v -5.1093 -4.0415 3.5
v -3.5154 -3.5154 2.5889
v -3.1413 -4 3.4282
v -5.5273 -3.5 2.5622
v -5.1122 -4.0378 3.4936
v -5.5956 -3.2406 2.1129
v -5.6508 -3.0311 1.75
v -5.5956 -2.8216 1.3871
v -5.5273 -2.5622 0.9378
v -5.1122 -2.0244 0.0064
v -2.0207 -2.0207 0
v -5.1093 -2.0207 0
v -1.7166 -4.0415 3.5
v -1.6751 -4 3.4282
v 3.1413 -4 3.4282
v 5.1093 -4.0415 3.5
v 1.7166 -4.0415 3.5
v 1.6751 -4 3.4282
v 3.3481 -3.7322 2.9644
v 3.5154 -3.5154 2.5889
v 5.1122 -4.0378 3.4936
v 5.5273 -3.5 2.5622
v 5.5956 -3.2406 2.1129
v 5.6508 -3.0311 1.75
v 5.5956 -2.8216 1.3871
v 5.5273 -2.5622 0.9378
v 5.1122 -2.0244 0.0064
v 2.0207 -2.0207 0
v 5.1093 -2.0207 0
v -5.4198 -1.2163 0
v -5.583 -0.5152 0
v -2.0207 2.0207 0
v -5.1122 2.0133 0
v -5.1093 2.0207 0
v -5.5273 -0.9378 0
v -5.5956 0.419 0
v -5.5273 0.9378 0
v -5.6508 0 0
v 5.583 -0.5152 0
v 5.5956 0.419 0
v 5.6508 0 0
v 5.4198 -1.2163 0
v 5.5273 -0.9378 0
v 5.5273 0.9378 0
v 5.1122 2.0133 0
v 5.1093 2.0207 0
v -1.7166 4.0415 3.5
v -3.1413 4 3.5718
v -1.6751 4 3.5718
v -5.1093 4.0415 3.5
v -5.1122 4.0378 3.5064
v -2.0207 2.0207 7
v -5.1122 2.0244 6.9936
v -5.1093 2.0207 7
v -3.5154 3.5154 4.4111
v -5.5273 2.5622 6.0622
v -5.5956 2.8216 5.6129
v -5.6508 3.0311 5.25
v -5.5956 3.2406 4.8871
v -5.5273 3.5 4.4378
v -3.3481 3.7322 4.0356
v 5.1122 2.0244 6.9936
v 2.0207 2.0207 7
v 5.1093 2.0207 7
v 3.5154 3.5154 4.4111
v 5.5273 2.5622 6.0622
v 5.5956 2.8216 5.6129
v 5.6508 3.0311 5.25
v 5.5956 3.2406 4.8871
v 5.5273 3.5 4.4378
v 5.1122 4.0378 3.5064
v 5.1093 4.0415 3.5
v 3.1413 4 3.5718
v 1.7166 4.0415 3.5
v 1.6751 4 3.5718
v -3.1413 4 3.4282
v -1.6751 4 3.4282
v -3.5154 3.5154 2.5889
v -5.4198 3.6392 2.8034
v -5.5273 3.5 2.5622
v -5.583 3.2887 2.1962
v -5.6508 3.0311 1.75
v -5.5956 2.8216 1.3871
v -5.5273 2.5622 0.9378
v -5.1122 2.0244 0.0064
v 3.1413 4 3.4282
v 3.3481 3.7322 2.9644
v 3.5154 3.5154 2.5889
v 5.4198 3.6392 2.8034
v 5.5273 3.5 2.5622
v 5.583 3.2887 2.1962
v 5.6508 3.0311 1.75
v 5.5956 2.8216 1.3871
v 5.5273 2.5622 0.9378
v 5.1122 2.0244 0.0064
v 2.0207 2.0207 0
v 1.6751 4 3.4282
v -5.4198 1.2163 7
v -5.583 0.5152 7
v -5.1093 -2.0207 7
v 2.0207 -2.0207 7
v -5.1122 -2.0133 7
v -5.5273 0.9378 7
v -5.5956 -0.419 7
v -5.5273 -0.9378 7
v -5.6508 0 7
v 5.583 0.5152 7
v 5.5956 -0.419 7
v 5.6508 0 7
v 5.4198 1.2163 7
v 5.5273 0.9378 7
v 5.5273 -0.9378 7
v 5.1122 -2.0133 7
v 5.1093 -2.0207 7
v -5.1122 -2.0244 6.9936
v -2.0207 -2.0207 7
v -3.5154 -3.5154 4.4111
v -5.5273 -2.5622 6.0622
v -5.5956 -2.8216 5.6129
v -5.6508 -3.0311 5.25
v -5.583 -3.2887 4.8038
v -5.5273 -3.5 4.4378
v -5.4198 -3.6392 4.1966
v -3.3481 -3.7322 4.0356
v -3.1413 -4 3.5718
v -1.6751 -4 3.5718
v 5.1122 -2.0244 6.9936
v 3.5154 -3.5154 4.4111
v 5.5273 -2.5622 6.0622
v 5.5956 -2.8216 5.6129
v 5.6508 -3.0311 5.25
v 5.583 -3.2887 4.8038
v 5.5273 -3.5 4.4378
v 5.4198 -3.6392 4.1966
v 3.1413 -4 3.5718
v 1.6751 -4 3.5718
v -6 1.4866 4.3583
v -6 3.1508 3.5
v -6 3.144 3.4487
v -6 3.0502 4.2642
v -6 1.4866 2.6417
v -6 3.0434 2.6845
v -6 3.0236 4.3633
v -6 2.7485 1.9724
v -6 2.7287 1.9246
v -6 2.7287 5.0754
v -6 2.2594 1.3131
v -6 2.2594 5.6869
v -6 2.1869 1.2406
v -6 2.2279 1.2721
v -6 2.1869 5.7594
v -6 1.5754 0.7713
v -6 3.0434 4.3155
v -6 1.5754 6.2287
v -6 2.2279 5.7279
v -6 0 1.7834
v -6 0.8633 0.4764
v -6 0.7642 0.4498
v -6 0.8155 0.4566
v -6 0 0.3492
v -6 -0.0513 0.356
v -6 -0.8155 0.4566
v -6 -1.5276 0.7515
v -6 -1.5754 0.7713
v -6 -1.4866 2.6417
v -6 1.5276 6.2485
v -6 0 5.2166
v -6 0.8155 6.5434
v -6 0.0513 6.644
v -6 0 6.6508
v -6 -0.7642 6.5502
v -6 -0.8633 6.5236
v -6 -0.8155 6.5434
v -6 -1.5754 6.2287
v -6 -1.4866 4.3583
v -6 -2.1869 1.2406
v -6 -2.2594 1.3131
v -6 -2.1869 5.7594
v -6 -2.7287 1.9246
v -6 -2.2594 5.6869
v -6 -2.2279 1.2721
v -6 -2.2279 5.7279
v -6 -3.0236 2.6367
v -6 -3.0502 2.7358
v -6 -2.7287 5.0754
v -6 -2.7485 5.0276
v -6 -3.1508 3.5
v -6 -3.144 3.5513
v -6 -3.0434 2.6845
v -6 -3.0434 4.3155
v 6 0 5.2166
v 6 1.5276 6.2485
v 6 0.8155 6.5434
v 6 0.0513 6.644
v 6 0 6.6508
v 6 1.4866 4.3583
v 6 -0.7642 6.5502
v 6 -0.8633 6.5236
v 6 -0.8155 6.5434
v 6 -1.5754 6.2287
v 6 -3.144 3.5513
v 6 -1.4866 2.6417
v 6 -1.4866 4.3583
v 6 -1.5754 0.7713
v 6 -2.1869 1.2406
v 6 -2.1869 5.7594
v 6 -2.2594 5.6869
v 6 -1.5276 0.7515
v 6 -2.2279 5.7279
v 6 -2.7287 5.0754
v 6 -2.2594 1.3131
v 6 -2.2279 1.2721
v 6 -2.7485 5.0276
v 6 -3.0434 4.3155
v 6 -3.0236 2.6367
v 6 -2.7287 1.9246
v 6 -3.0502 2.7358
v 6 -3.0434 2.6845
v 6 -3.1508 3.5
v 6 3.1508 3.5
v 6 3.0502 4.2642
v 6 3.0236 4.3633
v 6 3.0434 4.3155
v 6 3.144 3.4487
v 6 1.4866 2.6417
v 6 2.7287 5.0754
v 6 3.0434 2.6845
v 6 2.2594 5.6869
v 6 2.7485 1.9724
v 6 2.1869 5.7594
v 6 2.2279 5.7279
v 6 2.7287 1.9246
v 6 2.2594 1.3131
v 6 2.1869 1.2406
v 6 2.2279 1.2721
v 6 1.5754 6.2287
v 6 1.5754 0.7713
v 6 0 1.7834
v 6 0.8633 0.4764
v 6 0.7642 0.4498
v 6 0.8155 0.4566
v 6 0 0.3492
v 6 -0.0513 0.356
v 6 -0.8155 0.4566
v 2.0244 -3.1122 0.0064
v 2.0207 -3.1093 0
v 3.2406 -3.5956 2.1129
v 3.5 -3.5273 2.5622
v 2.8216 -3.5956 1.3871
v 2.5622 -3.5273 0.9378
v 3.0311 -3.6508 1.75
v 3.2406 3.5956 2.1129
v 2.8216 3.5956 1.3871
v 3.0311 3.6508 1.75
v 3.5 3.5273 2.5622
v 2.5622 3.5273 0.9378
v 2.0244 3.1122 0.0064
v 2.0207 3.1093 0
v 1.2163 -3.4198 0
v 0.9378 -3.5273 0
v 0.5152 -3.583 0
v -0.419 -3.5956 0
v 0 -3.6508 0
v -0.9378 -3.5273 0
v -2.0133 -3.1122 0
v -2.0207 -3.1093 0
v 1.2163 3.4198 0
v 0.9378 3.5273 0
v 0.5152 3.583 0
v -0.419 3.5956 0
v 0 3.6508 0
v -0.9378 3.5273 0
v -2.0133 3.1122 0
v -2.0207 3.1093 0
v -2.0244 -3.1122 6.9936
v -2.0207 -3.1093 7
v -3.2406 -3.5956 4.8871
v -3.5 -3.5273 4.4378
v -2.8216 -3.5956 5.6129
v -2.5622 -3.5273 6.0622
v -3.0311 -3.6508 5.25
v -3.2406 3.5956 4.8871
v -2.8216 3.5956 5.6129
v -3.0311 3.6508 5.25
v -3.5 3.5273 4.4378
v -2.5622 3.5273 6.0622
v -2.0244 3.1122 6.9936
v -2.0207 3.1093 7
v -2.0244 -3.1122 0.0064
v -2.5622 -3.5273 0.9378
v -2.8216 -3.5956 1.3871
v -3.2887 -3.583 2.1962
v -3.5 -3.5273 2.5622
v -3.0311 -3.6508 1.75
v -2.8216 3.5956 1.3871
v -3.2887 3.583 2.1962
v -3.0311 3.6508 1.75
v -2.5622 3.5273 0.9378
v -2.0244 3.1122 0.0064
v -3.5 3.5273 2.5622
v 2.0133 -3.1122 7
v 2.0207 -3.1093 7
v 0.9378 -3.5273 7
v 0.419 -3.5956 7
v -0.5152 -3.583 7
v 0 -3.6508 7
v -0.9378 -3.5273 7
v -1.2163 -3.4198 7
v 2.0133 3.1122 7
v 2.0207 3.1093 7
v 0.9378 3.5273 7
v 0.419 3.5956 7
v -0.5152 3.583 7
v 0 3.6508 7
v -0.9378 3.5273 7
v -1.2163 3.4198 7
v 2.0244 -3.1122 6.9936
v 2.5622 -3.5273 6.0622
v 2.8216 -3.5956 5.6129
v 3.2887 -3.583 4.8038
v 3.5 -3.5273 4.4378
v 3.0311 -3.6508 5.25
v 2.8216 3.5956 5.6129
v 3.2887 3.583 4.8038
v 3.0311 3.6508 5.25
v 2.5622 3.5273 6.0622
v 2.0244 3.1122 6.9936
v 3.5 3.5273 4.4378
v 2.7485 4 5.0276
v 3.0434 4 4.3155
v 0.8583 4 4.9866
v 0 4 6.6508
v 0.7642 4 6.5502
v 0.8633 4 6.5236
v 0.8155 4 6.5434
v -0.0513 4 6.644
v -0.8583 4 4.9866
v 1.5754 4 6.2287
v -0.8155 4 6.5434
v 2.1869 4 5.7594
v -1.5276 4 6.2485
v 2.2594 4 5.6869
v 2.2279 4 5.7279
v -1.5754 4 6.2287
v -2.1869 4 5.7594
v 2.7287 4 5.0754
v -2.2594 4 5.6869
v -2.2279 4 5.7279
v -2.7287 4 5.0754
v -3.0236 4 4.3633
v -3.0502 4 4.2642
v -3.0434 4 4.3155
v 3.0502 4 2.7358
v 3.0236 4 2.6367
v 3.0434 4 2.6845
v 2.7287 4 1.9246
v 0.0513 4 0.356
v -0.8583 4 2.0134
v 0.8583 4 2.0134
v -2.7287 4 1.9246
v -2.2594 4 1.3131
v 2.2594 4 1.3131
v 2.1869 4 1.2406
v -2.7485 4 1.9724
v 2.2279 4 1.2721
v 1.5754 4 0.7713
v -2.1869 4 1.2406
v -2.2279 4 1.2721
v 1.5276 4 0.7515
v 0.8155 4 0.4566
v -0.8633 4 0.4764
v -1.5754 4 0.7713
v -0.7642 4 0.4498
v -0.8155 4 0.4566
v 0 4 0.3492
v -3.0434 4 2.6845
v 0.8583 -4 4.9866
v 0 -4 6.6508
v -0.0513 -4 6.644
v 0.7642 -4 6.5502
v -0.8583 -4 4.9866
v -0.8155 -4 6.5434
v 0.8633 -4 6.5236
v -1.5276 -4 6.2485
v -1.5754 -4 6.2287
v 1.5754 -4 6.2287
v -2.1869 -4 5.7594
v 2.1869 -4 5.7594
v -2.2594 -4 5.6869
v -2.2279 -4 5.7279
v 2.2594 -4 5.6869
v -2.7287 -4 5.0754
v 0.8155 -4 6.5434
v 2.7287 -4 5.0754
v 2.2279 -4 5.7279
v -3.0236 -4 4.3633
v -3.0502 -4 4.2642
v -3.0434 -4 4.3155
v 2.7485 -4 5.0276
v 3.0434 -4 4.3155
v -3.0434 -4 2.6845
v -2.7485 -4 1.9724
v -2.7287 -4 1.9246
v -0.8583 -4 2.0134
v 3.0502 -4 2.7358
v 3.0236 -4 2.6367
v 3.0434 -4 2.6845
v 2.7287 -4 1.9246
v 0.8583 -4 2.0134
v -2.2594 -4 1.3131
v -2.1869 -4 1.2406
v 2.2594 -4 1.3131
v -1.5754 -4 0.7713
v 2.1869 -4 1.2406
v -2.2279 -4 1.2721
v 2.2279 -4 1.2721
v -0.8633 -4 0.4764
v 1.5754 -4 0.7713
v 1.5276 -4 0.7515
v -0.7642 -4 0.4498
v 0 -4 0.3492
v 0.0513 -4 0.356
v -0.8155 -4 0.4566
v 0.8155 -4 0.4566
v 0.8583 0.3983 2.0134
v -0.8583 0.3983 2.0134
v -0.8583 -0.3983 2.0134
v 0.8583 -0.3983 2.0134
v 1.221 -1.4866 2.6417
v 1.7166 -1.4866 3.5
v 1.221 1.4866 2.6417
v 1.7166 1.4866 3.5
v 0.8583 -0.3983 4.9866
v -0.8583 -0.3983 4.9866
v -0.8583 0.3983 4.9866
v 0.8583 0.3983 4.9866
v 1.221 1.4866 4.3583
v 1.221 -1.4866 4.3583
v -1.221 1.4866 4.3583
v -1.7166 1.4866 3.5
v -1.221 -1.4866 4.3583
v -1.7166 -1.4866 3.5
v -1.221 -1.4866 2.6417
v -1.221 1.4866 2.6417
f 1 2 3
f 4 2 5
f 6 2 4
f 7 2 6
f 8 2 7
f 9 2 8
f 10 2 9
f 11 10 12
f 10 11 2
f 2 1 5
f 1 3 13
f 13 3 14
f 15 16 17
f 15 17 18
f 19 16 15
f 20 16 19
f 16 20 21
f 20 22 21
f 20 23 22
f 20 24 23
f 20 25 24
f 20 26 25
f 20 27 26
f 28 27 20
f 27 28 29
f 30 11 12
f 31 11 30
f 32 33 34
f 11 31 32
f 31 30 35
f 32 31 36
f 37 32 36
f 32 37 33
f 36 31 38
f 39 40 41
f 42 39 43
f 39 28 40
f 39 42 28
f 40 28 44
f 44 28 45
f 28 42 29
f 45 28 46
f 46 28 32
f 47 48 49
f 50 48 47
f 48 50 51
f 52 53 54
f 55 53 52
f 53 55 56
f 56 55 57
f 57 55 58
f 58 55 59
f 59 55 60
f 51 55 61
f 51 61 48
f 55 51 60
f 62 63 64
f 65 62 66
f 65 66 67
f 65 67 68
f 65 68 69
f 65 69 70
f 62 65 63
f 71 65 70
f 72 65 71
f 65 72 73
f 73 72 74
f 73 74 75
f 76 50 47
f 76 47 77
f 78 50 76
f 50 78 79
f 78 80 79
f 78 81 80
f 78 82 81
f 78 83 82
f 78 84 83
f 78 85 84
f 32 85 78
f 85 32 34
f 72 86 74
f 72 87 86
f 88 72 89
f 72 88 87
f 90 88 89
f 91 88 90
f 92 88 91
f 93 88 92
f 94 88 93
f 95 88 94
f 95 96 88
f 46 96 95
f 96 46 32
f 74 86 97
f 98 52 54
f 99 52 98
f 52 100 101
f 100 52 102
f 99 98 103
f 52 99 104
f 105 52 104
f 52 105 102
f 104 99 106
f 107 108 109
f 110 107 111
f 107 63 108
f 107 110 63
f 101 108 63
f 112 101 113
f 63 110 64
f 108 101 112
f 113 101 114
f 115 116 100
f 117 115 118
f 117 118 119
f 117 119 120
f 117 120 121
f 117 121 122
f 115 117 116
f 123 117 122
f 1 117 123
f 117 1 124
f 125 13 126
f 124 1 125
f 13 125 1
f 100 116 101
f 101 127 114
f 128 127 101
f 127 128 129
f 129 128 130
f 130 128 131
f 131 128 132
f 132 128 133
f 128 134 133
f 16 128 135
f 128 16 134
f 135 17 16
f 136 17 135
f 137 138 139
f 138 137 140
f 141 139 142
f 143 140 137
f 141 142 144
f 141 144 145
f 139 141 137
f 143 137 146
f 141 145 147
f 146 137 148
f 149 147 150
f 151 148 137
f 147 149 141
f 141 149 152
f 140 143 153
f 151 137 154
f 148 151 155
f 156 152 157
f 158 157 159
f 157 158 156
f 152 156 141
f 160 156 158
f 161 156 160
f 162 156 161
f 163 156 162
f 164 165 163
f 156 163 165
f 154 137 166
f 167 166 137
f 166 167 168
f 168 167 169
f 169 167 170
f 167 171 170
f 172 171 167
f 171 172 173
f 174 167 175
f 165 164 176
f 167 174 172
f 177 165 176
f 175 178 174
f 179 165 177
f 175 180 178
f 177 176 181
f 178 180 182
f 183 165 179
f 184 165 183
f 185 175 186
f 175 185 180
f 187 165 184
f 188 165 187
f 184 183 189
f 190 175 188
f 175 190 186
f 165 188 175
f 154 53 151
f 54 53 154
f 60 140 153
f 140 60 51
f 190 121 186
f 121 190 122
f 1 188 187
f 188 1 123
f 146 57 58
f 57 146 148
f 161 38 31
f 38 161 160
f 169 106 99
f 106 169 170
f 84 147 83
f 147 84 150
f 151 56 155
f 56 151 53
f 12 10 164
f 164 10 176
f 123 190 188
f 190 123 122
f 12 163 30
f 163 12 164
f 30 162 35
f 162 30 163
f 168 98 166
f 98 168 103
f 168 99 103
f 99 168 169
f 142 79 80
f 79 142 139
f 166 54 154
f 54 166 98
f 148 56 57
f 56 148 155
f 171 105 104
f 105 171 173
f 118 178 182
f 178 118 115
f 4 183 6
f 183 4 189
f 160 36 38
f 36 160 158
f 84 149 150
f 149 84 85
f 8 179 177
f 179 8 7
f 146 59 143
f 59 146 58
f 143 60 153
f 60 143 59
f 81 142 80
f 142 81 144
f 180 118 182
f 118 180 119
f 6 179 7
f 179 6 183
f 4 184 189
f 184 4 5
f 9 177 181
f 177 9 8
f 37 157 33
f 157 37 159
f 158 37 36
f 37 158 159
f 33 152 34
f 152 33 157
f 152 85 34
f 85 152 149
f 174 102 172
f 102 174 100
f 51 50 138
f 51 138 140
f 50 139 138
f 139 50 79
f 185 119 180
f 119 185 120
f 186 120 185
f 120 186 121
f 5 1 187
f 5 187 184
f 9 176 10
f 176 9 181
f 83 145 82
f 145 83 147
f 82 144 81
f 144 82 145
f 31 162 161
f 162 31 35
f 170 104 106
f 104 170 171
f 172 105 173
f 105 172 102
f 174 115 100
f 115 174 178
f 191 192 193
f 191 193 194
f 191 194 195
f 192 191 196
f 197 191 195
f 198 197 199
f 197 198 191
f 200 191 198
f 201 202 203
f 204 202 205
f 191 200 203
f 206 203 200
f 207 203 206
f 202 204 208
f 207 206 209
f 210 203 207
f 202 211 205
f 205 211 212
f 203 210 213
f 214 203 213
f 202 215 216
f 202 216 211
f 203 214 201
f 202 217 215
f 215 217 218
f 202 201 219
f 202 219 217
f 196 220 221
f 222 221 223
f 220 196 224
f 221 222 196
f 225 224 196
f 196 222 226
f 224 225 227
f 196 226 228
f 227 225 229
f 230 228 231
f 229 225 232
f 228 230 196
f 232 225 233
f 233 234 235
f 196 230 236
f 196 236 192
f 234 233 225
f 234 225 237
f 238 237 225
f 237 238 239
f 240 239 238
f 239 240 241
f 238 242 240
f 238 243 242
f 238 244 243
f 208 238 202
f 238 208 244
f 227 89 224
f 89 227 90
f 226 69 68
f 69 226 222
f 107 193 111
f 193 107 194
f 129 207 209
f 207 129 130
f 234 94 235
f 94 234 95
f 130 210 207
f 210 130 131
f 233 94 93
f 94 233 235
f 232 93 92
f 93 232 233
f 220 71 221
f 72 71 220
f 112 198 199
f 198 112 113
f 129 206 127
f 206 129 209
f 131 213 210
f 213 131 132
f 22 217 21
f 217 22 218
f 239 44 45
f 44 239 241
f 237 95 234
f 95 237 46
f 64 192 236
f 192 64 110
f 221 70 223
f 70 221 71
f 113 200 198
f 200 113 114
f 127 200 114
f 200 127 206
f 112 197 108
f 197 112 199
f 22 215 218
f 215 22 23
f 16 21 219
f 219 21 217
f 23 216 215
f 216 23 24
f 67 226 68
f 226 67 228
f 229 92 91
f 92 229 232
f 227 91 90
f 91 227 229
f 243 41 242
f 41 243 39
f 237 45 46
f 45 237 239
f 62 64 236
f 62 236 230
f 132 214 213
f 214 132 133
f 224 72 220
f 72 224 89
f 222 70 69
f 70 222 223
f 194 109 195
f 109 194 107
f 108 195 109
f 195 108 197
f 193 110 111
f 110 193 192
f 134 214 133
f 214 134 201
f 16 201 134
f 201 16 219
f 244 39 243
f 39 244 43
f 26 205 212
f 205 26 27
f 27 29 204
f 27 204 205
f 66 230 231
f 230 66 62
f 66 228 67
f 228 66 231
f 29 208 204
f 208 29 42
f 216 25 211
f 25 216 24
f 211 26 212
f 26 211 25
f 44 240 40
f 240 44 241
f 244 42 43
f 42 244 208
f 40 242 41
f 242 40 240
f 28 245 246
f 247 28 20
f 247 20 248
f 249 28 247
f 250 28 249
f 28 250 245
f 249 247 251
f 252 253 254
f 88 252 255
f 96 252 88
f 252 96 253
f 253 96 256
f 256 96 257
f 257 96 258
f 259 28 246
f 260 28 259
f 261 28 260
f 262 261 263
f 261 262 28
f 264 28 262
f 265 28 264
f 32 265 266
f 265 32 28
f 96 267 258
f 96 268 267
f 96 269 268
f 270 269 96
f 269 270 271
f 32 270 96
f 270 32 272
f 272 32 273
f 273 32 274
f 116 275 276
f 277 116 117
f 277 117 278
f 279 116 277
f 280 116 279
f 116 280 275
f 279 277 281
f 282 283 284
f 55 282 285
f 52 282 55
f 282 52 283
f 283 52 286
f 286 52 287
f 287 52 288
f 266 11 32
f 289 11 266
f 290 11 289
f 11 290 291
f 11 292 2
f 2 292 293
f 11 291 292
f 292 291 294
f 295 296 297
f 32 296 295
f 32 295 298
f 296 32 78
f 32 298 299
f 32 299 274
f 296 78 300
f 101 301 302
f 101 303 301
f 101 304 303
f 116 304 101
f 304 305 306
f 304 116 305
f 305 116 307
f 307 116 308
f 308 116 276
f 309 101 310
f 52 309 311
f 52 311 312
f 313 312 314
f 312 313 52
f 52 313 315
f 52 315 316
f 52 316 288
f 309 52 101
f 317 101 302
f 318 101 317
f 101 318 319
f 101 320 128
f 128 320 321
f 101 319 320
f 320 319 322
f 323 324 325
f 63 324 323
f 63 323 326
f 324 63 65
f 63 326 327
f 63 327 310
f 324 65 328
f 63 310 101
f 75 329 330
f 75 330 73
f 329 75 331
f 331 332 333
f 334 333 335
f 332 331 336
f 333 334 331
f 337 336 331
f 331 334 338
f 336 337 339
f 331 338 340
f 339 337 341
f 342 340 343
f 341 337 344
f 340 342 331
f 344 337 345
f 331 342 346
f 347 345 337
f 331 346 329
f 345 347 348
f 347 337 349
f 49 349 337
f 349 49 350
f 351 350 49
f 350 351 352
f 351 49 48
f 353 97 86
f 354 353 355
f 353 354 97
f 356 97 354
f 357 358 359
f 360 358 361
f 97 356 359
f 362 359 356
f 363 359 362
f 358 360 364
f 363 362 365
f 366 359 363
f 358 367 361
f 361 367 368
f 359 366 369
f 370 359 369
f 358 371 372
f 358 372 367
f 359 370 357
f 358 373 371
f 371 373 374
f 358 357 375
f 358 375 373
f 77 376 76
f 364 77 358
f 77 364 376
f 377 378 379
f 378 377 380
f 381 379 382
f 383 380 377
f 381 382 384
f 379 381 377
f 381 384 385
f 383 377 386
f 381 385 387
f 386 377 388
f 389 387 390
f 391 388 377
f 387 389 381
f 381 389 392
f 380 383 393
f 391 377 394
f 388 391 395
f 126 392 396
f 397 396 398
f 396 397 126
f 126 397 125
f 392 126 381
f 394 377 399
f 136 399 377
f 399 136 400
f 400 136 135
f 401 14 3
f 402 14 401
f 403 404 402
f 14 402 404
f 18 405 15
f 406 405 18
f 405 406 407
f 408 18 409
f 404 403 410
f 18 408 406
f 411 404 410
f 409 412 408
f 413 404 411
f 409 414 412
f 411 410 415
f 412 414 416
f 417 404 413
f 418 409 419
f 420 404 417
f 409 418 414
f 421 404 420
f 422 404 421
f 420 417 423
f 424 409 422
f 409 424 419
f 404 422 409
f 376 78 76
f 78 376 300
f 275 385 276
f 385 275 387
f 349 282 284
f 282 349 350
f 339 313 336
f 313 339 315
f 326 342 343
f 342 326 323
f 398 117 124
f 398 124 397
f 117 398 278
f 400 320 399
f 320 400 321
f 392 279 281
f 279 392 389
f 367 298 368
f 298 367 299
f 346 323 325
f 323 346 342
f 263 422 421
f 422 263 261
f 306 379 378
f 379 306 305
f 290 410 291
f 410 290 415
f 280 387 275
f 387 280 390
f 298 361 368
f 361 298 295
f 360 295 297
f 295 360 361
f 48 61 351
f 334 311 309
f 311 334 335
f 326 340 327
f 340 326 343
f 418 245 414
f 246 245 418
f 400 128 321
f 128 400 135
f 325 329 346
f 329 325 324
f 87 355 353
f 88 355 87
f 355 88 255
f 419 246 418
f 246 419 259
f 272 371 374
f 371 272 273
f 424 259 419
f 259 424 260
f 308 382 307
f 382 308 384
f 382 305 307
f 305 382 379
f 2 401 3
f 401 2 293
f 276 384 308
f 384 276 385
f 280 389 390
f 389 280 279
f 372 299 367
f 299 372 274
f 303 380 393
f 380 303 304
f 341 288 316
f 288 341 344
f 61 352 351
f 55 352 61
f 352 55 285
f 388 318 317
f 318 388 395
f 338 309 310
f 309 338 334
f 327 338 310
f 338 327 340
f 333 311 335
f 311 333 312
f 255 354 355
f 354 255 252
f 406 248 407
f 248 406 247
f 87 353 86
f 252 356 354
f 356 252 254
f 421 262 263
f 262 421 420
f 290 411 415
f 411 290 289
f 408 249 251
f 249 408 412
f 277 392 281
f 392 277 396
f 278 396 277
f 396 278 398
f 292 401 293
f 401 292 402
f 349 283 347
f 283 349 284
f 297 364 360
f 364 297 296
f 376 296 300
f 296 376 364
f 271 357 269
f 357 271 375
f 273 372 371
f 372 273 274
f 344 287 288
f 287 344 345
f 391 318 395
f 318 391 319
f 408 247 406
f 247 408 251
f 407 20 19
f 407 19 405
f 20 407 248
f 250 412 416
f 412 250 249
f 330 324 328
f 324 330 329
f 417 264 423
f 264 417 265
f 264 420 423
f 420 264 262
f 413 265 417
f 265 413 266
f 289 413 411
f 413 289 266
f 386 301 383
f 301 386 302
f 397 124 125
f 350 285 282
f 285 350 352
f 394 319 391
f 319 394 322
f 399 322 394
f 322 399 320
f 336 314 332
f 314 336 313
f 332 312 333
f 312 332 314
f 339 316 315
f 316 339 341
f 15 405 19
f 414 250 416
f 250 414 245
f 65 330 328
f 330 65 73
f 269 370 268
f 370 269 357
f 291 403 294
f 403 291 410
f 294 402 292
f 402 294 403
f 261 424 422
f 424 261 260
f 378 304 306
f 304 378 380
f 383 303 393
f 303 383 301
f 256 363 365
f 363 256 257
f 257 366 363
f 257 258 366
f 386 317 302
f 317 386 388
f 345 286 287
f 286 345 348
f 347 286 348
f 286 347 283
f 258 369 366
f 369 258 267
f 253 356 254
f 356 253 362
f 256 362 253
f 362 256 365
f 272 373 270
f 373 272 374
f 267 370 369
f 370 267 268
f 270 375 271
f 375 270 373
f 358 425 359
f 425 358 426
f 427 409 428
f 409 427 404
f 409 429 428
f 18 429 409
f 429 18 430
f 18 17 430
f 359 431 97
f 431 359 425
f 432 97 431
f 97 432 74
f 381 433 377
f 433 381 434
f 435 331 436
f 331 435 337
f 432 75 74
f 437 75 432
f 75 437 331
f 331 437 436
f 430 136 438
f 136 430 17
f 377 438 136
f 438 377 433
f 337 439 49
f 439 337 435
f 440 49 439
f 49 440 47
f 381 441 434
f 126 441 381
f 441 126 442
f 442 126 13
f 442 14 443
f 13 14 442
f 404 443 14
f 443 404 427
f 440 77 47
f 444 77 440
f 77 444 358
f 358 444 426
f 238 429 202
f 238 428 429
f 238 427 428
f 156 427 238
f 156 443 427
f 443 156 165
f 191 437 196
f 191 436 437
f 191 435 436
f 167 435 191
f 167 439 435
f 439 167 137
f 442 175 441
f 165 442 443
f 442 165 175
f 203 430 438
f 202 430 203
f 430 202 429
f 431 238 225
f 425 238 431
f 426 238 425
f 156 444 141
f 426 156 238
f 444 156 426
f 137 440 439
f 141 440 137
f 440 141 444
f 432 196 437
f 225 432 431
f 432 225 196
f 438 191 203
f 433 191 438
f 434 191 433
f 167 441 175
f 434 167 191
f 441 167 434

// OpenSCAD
// file: polyholes.scad
//
// Mendel90
//
// GNU GPL v2
// nop.head@gmail.com
// hydraraptor.blogspot.com
//
// See http://hydraraptor.blogspot.com/2011/02/polyholes.html
//
function sides(r) = max(round(4 *r),3);
function corrected_radius(r,n) = 0.1 + r / cos(180 / n);
function corrected_diameter(d) = 0.2 + d / cos(180 / sides(d / 2));

module poly_circle(r, center = false) {
    n = sides(r);
    circle(r = corrected_radius(r,n), $fn = n, center = center);
}

module poly_cylinder(r, h, center = false) {
    n = sides(r);
    cylinder(h = h, r = corrected_radius(r,n), $fn = n, center = center);
}

module poly_d_cylinder(r, center = false) {
    n = sides(r);
    r = corrected_radius(r,n);
    cylinder(h = h, r = r, $fn = n, center = center);
    translate([0, -r, 0])
        cube([r, 2 * r, h]);
}
// main file
use <polyholes.scad>

h = 7;
r = h/2 / cos(30);

module stumpy() {
  rotate([0, 90, 0]) rotate([0, 0, 30]) intersection() {
    cylinder(r=r, h=8, center=true, $fn=6);
    sphere(r=5.1, $fn=24);
  }
}

module middle() {
  difference() {
    union() {
      translate([-2, 0, 0]) stumpy();
      translate([2, 0, 0]) stumpy();
      rotate([0, 0, 90]) stumpy();
    }
    rotate([90, 0, 0]) poly_cylinder(r=1.4, h=30, center=true, $fn=12);
    rotate([0, 90, 0]) poly_cylinder(r=1.4, h=30, center=true, $fn=12);
  }
}

translate([0, 0, h/2]) middle();
